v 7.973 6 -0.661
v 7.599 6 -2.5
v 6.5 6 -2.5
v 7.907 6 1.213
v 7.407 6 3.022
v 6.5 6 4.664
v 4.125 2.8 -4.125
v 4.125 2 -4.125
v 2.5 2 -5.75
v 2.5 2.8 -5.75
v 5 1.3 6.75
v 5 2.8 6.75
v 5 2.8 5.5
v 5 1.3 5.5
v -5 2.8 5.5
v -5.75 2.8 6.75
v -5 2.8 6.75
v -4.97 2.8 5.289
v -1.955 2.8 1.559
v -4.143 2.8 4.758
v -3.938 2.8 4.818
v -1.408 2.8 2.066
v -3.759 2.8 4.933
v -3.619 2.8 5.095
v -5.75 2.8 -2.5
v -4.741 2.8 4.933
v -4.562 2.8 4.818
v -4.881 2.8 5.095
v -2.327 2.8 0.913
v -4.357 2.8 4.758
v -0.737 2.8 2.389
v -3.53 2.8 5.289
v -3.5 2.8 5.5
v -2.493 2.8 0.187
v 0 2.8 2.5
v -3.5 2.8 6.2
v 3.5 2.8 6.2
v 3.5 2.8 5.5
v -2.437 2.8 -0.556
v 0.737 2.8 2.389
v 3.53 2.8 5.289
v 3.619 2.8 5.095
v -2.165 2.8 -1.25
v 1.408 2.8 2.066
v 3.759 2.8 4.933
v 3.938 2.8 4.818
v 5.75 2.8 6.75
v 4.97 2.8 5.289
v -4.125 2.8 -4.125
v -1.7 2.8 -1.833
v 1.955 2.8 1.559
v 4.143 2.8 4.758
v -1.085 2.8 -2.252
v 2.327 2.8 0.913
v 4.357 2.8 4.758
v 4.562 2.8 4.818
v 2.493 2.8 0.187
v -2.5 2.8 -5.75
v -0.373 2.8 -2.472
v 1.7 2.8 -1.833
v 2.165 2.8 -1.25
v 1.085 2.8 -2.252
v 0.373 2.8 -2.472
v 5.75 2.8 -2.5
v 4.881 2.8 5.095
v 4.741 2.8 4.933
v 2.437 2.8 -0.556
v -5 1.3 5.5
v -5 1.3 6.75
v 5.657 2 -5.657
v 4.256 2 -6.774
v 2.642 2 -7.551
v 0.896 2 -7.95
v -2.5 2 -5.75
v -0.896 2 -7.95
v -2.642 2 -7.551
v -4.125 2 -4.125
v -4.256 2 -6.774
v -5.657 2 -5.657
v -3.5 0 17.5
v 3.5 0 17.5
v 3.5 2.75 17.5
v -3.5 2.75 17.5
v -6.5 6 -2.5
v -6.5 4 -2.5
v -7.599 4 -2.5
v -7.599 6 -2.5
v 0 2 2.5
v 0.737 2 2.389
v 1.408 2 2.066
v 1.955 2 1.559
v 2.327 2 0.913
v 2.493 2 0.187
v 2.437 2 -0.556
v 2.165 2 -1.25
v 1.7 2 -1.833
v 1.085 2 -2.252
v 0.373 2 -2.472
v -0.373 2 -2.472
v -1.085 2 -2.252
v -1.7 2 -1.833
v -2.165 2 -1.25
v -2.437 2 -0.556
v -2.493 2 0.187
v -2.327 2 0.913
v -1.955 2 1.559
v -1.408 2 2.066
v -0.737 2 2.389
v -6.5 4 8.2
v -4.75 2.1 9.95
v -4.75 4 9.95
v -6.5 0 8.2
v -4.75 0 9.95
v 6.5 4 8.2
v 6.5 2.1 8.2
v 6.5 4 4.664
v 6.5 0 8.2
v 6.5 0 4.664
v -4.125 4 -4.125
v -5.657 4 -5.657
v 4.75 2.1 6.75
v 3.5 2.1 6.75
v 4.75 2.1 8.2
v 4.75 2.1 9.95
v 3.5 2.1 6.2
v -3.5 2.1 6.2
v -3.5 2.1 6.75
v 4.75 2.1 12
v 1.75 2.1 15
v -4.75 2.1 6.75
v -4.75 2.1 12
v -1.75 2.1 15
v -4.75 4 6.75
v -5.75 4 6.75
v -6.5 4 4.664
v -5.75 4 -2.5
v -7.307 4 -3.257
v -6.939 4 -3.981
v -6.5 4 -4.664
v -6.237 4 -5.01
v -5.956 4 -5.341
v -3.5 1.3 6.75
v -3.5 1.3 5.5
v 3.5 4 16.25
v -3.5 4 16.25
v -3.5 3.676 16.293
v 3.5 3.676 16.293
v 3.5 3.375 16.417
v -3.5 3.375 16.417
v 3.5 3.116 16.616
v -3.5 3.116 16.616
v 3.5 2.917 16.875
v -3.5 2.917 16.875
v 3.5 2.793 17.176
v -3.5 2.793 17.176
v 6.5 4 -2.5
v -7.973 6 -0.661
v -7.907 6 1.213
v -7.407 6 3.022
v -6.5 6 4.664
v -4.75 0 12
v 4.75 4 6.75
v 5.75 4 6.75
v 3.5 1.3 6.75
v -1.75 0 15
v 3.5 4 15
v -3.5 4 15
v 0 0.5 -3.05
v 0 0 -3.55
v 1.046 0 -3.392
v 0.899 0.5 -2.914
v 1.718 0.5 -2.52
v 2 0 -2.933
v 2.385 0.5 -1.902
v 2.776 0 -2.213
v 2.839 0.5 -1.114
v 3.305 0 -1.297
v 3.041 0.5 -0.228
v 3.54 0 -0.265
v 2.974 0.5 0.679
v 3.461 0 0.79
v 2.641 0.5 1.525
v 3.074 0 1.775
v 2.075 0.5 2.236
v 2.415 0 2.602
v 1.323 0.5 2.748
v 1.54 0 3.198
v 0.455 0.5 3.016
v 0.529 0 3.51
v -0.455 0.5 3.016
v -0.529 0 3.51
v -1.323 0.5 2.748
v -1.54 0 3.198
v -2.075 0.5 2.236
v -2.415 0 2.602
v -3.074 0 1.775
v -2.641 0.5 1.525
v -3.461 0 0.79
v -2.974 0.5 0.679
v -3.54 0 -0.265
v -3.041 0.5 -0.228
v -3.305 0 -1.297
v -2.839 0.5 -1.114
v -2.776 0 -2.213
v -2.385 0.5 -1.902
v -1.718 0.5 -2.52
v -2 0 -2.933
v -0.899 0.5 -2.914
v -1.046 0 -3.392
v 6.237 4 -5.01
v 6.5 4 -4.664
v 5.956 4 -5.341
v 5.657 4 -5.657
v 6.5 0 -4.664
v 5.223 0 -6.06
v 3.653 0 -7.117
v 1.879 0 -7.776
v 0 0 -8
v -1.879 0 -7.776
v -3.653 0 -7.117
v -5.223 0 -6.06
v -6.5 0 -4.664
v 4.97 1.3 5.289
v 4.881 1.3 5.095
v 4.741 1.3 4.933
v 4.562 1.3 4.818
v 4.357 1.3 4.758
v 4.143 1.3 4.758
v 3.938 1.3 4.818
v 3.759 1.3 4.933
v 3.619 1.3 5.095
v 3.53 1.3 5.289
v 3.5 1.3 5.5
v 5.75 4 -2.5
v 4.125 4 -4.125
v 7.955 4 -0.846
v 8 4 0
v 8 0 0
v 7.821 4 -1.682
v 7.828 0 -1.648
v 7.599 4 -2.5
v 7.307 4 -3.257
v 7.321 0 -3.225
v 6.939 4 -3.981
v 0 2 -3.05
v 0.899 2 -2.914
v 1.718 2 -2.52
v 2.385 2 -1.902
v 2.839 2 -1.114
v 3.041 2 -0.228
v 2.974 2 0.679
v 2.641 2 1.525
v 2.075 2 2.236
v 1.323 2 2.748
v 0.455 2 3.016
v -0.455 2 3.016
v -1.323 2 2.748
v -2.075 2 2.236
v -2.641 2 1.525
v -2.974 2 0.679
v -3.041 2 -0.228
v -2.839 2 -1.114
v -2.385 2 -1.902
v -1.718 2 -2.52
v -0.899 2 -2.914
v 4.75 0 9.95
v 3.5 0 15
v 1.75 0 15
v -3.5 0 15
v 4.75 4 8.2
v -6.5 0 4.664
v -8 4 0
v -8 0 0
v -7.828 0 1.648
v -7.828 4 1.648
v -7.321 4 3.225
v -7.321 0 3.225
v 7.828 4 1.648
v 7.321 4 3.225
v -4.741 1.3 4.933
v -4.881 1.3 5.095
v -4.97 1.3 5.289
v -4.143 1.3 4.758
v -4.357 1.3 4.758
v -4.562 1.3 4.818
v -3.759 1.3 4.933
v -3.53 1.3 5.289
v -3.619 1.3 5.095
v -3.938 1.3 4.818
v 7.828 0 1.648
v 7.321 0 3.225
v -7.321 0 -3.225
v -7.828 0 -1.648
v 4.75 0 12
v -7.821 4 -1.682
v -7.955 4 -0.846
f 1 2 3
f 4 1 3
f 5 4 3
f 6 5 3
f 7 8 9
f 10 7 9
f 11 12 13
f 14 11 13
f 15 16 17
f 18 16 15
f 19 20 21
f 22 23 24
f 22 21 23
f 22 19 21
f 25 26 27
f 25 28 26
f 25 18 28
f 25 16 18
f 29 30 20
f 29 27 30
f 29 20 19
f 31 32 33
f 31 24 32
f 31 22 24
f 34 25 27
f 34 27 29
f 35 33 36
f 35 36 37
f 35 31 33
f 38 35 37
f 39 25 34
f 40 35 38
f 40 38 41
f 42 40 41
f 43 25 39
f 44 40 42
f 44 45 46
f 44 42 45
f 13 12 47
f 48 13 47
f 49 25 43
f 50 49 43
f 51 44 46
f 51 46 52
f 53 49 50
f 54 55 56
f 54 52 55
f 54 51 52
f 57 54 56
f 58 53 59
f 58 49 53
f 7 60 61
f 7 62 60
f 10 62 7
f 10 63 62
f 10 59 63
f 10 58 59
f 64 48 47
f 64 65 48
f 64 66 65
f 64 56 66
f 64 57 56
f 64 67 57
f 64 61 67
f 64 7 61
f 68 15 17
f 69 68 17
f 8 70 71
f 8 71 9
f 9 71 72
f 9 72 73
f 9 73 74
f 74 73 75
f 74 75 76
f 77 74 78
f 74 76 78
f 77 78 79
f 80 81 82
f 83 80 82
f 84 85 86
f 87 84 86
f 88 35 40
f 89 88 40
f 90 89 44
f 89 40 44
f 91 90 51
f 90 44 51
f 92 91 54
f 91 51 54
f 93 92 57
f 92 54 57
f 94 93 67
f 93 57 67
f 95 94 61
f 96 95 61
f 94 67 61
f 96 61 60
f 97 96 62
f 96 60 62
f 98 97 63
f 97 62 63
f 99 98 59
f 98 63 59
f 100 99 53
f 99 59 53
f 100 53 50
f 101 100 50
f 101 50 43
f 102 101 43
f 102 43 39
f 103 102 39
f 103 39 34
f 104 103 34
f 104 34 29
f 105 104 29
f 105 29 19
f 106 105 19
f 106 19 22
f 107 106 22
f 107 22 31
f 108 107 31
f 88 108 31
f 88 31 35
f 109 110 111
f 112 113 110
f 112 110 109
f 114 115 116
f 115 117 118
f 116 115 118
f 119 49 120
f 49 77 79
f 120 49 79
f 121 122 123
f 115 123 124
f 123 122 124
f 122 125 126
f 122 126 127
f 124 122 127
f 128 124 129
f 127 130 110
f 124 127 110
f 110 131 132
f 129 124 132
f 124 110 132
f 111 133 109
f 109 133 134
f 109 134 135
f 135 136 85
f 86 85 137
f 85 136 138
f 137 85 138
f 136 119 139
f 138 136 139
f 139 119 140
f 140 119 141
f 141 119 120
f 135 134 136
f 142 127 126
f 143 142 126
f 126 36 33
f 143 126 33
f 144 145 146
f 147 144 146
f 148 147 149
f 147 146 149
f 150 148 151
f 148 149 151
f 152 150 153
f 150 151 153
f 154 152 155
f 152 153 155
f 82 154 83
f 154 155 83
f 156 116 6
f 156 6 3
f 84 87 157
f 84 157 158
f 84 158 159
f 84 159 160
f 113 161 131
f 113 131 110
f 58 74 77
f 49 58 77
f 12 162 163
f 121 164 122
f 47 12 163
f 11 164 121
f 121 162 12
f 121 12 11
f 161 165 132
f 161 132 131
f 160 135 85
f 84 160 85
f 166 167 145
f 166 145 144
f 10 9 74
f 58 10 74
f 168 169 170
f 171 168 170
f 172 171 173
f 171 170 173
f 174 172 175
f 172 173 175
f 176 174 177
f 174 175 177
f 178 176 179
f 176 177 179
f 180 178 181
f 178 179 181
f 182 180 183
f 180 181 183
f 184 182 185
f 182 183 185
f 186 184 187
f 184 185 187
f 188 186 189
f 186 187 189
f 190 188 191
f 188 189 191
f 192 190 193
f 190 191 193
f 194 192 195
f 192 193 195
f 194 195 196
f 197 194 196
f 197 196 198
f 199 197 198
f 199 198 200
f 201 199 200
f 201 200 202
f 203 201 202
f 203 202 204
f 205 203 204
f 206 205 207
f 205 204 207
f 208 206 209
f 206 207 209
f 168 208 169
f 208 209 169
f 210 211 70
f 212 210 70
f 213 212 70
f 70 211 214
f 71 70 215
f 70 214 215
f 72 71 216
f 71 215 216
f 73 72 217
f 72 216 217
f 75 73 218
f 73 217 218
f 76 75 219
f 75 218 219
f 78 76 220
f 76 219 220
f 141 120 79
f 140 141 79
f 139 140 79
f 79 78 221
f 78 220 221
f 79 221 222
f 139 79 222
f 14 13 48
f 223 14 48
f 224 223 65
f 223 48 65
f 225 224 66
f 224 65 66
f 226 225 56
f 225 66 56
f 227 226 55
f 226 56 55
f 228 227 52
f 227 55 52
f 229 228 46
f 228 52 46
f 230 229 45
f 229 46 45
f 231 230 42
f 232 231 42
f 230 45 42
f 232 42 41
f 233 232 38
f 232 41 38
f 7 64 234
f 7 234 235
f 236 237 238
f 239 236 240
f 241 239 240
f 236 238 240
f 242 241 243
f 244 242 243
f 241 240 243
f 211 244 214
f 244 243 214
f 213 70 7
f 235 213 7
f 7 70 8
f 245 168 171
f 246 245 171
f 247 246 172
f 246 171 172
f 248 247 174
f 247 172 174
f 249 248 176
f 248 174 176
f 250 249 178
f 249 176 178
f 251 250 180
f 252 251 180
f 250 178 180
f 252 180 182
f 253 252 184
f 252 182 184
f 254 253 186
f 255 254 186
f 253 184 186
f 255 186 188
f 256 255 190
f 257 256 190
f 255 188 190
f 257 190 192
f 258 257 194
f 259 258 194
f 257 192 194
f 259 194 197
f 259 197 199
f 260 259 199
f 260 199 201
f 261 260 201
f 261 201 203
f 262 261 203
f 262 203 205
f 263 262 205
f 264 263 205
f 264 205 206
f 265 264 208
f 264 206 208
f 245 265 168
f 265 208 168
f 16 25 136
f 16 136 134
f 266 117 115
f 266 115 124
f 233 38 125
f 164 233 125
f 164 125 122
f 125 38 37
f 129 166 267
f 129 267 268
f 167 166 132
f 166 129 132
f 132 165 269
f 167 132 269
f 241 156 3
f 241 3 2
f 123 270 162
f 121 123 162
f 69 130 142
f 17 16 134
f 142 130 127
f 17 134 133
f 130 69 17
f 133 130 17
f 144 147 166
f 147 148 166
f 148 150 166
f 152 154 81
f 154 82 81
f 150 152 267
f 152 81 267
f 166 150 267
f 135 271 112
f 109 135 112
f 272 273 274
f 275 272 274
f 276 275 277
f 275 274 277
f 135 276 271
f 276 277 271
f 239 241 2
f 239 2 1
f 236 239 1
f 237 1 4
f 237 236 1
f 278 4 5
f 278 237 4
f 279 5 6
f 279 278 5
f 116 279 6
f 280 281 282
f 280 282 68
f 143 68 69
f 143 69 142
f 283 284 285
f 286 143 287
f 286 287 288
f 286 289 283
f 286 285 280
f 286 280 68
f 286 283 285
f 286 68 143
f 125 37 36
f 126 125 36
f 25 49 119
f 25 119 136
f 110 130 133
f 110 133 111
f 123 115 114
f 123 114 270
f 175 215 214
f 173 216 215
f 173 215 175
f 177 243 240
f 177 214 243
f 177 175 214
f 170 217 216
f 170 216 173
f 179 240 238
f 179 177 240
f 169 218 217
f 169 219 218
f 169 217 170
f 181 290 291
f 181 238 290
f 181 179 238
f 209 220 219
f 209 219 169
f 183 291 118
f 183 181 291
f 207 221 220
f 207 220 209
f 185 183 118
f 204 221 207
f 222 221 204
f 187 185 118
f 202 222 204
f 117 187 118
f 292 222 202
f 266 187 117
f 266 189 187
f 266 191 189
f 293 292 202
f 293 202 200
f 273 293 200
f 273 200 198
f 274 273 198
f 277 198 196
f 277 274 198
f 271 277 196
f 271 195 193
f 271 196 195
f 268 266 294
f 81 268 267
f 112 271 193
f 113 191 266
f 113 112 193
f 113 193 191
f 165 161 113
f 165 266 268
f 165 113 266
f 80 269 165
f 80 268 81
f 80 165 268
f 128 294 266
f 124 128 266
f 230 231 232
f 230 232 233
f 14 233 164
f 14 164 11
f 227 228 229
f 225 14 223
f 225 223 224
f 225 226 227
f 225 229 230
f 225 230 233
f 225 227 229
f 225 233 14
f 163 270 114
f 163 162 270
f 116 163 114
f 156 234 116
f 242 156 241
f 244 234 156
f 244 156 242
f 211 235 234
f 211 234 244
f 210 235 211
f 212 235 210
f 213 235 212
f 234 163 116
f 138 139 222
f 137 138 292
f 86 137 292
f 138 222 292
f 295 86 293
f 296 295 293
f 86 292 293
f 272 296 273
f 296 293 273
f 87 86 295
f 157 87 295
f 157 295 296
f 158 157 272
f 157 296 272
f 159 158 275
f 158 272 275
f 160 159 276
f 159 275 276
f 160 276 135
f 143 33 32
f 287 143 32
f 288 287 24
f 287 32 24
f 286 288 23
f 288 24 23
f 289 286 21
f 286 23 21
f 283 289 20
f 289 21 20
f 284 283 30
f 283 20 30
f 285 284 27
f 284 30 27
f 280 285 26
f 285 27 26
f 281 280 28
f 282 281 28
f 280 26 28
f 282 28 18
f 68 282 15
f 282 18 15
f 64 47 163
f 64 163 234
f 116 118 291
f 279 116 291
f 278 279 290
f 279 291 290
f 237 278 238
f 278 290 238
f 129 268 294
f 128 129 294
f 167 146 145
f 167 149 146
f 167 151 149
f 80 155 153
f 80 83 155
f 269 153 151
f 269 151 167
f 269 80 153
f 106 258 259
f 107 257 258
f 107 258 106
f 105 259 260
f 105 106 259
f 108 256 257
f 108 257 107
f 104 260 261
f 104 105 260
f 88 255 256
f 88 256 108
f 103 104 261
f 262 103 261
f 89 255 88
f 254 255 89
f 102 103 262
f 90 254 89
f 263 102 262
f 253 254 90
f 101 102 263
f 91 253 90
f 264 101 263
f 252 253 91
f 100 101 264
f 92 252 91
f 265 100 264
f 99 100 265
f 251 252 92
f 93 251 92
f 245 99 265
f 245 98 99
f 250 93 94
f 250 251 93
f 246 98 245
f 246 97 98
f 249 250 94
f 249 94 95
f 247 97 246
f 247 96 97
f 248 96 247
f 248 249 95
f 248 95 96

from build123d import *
from build123d.topology import SkipClean

# Parameters (mm, degrees)
BOSS_EXTRUDE1_DEPTH      = 4
SKETCH2_R                = 3.05
CUT_EXTRUDE1_DEPTH       = 2
SKETCH3_R                = 1.5
CUT_EXTRUDE2_DEPTH       = 22.633307653
CUT_EXTRUDE4_START       = -1.2
CUT_EXTRUDE4_DEPTH       = 1.2
CUT_EXTRUDE6_DEPTH       = 1.5
CUT_EXTRUDE7_DEPTH       = 0.7
BOSS_EXTRUDE3_DEPTH      = 2
CUT_EXTRUDE12_START      = -2
CUT_EXTRUDE12_DEPTH      = 2
SKETCH6_R                = 2.5
CUT_EXTRUDE13_DEPTH      = 22.777052142
SKETCH17_W               = 0.35
SKETCH17_H               = 1.45
CUT_EXTRUDE14_DEPTH      = 1.9
BOSS_EXTRUDE5_DEPTH      = 1.9
CUT_EXTRUDE15_DEPTH      = 22.9089023
CUT_EXTRUDE15_DEPTH_BACK = 22.9089023
CUT_EXTRUDE16_DEPTH      = 22.890865675
CUT_EXTRUDE16_DEPTH_BACK = 22.890865675
CUT_EXTRUDE17_DEPTH      = 24.837994882
CUT_EXTRUDE17_DEPTH_BACK = 24.837994882
CHAMFER1_SIZE            = 1.75
CUT_EXTRUDE18_DEPTH      = 24.837994882
BOSS_EXTRUDE6_DEPTH      = 1.9
CHAMFER2_SIZE            = 0.5


with BuildPart() as part:
    # Sketch1 → Boss-Extrude1 (new body)
    with BuildSketch(Plane(origin=(0, 0, 0), x_dir=(1, 0, 0), z_dir=(0, 1, 0))):
        with BuildLine():
            Line((6.5, -20), (6.5, -4.663689527))
            ThreePointArc((6.5, -4.663689527), (7.615773106, -2.449489743), (8, 0))
            ThreePointArc((8, 0), (7.615773106, 2.449489743), (6.5, 4.663689527))
            ThreePointArc((6.5, 4.663689527), (0, 8), (-6.5, 4.663689527))
            ThreePointArc((-6.5, 4.663689527), (-7.615773106, 2.449489743), (-8, 0))
            ThreePointArc((-8, 0), (-7.615773106, -2.449489743), (-6.5, -4.663689527))
            Line((-6.5, -4.663689527), (-6.5, -20))
            Line((-6.5, -20), (6.5, -20))
        make_face()
    extrude(amount=BOSS_EXTRUDE1_DEPTH)

    # Sketch2 → Cut-Extrude1 (cut)
    with BuildSketch(Plane.XZ):
        with Locations(Location((0, 0, 0), (0, 0, 270))):
            Circle(SKETCH2_R)
    extrude(amount=-CUT_EXTRUDE1_DEPTH, mode=Mode.SUBTRACT)

    # Sketch3 → Cut-Extrude2 (cut, through all)
    with BuildSketch(Plane.XZ.offset(-2)):
        with Locations(Location((0, 0, 0), (0, 0, 270))):
            Circle(SKETCH3_R)
    extrude(amount=-CUT_EXTRUDE2_DEPTH, mode=Mode.SUBTRACT)

    # Sketch5 → Cut-Extrude4 (cut)
    with BuildSketch(Plane(origin=(0, 4, 0), x_dir=(1, 0, 0), z_dir=(0, 1, 0)).offset(CUT_EXTRUDE4_START)):
        with BuildLine():
            Line((5.75, 2.5), (2.5, 5.75))
            Line((2.5, 5.75), (0.75, 5.75))
            Line((0.75, 5.75), (0.75, 7.964766161))
            ThreePointArc((0.75, 7.964766161), (0, 8), (-0.75, 7.964766161))
            Line((-0.75, 7.964766161), (-0.75, 5.75))
            Line((-0.75, 5.75), (-2.5, 5.75))
            Line((-2.5, 5.75), (-5.75, 2.5))
            Line((-5.75, 2.5), (-5.75, -6.75))
            Line((-5.75, -6.75), (-4.4, -6.75))
            Line((-4.4, -6.75), (-4.4, -8.2))
            Line((-4.4, -8.2), (-5.66, -10))
            Line((-5.66, -10), (-6.5, -10))
            Line((-6.5, -10), (-6.5, -11.2))
            Line((-6.5, -11.2), (-6.5, -15))
            Line((-6.5, -15), (6.5, -15))
            Line((6.5, -15), (6.5, -11.2))
            Line((6.5, -11.2), (6.5, -10))
            Line((6.5, -10), (6.5, -8.2))
            Line((6.5, -8.2), (4.4, -8.2))
            Line((4.4, -8.2), (4.4, -6.75))
            Line((4.4, -6.75), (5.75, -6.75))
            Line((5.75, -6.75), (5.75, 2.5))
        make_face()
    extrude(amount=CUT_EXTRUDE4_DEPTH, mode=Mode.SUBTRACT)

    # Sketch7 → Cut-Extrude6 (cut)
    with BuildSketch(Plane(origin=(0, 2.8, 0), x_dir=(1, 0, 0), z_dir=(0, 1, 0))):
        with BuildLine():
            Line((-4.999999999, -5.5), (-4.999999999, -6.75))
            Line((-4.999999999, -6.75), (-3.499999999, -6.75))
            Line((-3.499999999, -6.75), (-3.499999999, -5.5))
            ThreePointArc((-3.499999999, -5.5), (-4.249999999, -4.75), (-4.999999999, -5.5))
        make_face()
        with BuildLine():
            Line((3.500000001, -5.5), (3.500000001, -6.75))
            Line((3.500000001, -6.75), (5.000000001, -6.75))
            Line((5.000000001, -6.75), (5.000000001, -5.5))
            ThreePointArc((5.000000001, -5.5), (4.250000001, -4.75), (3.500000001, -5.5))
        make_face()
    extrude(amount=-CUT_EXTRUDE6_DEPTH, mode=Mode.SUBTRACT)

    # Sketch9 → Cut-Extrude7 (cut)
    with BuildSketch(Plane(origin=(0, 2.8, 0), x_dir=(1, 0, 0), z_dir=(0, 1, 0))):
        Polygon((-6.5, -15), (6.5, -15), (6.5, -11.2), (6.5, -10), (6.5, -8.2), (4.75, -8.2), (4.75, -6.2), (4.4, -6.2), (-4.4, -6.2), (-4.75, -6.2), (-4.75, -8.7), (-5.66, -10), (-6.5, -10), (-6.5, -11.2), align=None)
    extrude(amount=-CUT_EXTRUDE7_DEPTH, mode=Mode.SUBTRACT)

    # Sketch14 → Boss-Extrude3 (add)
    with SkipClean():  # the faces are left unmerged after this step: merging them gives an invalid solid
        with BuildSketch(Plane(origin=(0, 4, 0), x_dir=(1, 0, 0), z_dir=(0, 1, 0))):
            with BuildLine():
                Line((6.5, -4.663689527), (6.5, 2.5))
                Line((6.5, 2.5), (7.599342077, 2.5))
                ThreePointArc((7.599342077, 2.5), (7.907431546, -1.213476964), (6.5, -4.663689527))
            make_face()
            with BuildLine():
                Line((-6.5, -4.663689527), (-6.5, 2.5))
                Line((-6.5, 2.5), (-7.599342077, 2.5))
                ThreePointArc((-7.599342077, 2.5), (-7.907431546, -1.213476964), (-6.5, -4.663689527))
            make_face()
        extrude(amount=BOSS_EXTRUDE3_DEPTH)

    # Sketch15 → Cut-Extrude12 (cut)
    with SkipClean():  # the faces are left unmerged after this step: merging them gives an invalid solid
        with BuildSketch(Plane(origin=(0, 4, 0), x_dir=(1, 0, 0), z_dir=(0, 1, 0)).offset(CUT_EXTRUDE12_START)):
            with BuildLine():
                Line((2.5, 5.75), (-2.5, 5.75))
                Line((-2.5, 5.75), (-4.125, 4.125))
                Line((-4.125, 4.125), (-5.656854249, 5.656854249))
                ThreePointArc((-5.656854249, 5.656854249), (0, 8), (5.656854249, 5.656854249))
                Line((5.656854249, 5.656854249), (4.125, 4.125))
                Line((4.125, 4.125), (2.5, 5.75))
            make_face()
        extrude(amount=CUT_EXTRUDE12_DEPTH, mode=Mode.SUBTRACT)

    # Sketch6 → Cut-Extrude13 (cut, through all)
    with SkipClean():  # the faces are left unmerged after this step: merging them gives an invalid solid
        with BuildSketch(Plane(origin=(0, 2.8, 0), x_dir=(1, 0, 0), z_dir=(0, 1, 0))):
            with Locations(Location((0, 0, 0), (0, 0, 270))):
                Circle(SKETCH6_R)
        extrude(amount=-CUT_EXTRUDE13_DEPTH, mode=Mode.SUBTRACT)

    # Sketch17 → Cut-Extrude14 (cut)
    with SkipClean():  # the faces are left unmerged after this step: merging them gives an invalid solid
        with BuildSketch(Plane(origin=(0, 4, 0), x_dir=(1, 0, 0), z_dir=(0, 1, 0))):
            Polygon((-4.75, -6.75), (-4.4, -6.75), (-4.4, -8.2), (-4.75, -8.7), align=None)
            with Locations((4.575, -7.475)):
                Rectangle(SKETCH17_W, SKETCH17_H)
        extrude(amount=-CUT_EXTRUDE14_DEPTH, mode=Mode.SUBTRACT)

    # Sketch18 → Boss-Extrude5 (add)
    with SkipClean():  # the faces are left unmerged after this step: merging them gives an invalid solid
        with BuildSketch(Plane(origin=(0, 2.1, 0), x_dir=(1, 0, 0), z_dir=(0, 1, 0))):
            Polygon((-6.5, -10), (-6.5, -15), (-4.75, -15), (-4.75, -8.7), (-5.66, -10), align=None)
        extrude(amount=BOSS_EXTRUDE5_DEPTH)

    # Sketch19 → Cut-Extrude15 (cut, two sides: drawn at the far end of the back side and taken through both)
    with SkipClean():  # the faces are left unmerged after this step: merging them gives an invalid solid
        with BuildSketch(Plane(origin=(0, 4, 0), x_dir=(1, 0, 0), z_dir=(0, 1, 0)).offset(-CUT_EXTRUDE15_DEPTH_BACK)):
            Polygon((-6.5, -20), (-3.5, -20), (-3.5, -15), (-4.75, -15), (-4.75, -8.2), (-6.5, -8.2), align=None)
            Polygon((4.75, -8.2), (6.5, -8.2), (6.5, -20), (3.5, -20), (3.5, -15), (4.75, -15), align=None)
        extrude(amount=CUT_EXTRUDE15_DEPTH + CUT_EXTRUDE15_DEPTH_BACK, mode=Mode.SUBTRACT)

    # Sketch20 → Cut-Extrude16 (cut, two sides: drawn at the far end of the back side and taken through both)
    with SkipClean():  # the faces are left unmerged after this step: merging them gives an invalid solid
        with BuildSketch(Plane(origin=(0, 2.1, 0), x_dir=(1, 0, 0), z_dir=(0, 1, 0)).offset(-CUT_EXTRUDE16_DEPTH_BACK)):
            Polygon((4.75, -15), (1.75, -15), (4.75, -12), align=None)
            Polygon((-4.75, -15), (-1.75, -15), (-4.75, -12), align=None)
        extrude(amount=CUT_EXTRUDE16_DEPTH + CUT_EXTRUDE16_DEPTH_BACK, mode=Mode.SUBTRACT)

    # Sketch21 → Cut-Extrude17 (cut, two sides: drawn at the far end of the back side and taken through both)
    with SkipClean():  # the faces are left unmerged after this step: merging them gives an invalid solid
        with BuildSketch(Plane(origin=(3.5, 0, 0), x_dir=(0, 0, -1), z_dir=(1, 0, 0)).offset(-CUT_EXTRUDE17_DEPTH_BACK)):
            with BuildLine():
                Line((-18.75, 4), (-16.25, 4))
                ThreePointArc((-16.25, 4), (-17.5, 2.75), (-18.75, 4))
            make_face()
        extrude(amount=CUT_EXTRUDE17_DEPTH + CUT_EXTRUDE17_DEPTH_BACK, mode=Mode.SUBTRACT)

    # Chamfer1
    # the kernel refuses this chamfer: 1.75 mm, written as the material it adds along each edge
    with BuildSketch(Plane(origin=(4.75, 0, 8.2), x_dir=(0.9996219169112968, 0, -0.027495876610586112), z_dir=(0, 1, 0))) as chamfer1_piece_1:
        Polygon((CHAMFER1_SIZE * 0.999621916911, -CHAMFER1_SIZE * 0.0274958766106), (-CHAMFER1_SIZE * 0.0274958766106, -CHAMFER1_SIZE * 0.999621916911), (0, 0), align=None)
    extrude(amount=2.1)
    with BuildSketch(Plane(origin=(-4.75, 2.1, 8.2), x_dir=(0.02749587661058662, 0, 0.9996219169112968), z_dir=(0, -1, 0))) as chamfer1_piece_2:
        Polygon((CHAMFER1_SIZE * 0.999621916911, CHAMFER1_SIZE * 0.0274958766106), (-CHAMFER1_SIZE * 0.0274958766106, CHAMFER1_SIZE * 0.999621916911), (0, 0), align=None)
    extrude(amount=2.1)

    # Sketch22 → Cut-Extrude18 (cut, through all)
    with BuildSketch(Plane(origin=(3.5, 0, 0), x_dir=(0, 0, -1), z_dir=(1, 0, 0))):
        with BuildLine():
            Line((-20, 0), (-17.5, 0))
            Line((-17.5, 0), (-17.5, 2.75))
            ThreePointArc((-17.5, 2.75), (-18.383883476, 3.116116524), (-18.75, 4))
            Line((-18.75, 4), (-20, 4))
            Line((-20, 4), (-20, 2.75))
            Line((-20, 2.75), (-20, 0))
        make_face()
    extrude(amount=-CUT_EXTRUDE18_DEPTH, mode=Mode.SUBTRACT)

    # Sketch24 → Boss-Extrude6 (add)
    with BuildSketch(Plane(origin=(0, 2.1, 0), x_dir=(1, 0, 0), z_dir=(0, 1, 0))):
        Polygon((-6.5, -8.2), (-4.75, -8.2), (-4.75, -9.95), align=None)
    extrude(amount=BOSS_EXTRUDE6_DEPTH)

    # Chamfer2
    chamfer2_edges = [part.edges().sort_by_distance(p)[0] for p in [
        (0, 0, 3.05),
    ]]
    chamfer(chamfer2_edges, length=CHAMFER2_SIZE)


solid = part.part
